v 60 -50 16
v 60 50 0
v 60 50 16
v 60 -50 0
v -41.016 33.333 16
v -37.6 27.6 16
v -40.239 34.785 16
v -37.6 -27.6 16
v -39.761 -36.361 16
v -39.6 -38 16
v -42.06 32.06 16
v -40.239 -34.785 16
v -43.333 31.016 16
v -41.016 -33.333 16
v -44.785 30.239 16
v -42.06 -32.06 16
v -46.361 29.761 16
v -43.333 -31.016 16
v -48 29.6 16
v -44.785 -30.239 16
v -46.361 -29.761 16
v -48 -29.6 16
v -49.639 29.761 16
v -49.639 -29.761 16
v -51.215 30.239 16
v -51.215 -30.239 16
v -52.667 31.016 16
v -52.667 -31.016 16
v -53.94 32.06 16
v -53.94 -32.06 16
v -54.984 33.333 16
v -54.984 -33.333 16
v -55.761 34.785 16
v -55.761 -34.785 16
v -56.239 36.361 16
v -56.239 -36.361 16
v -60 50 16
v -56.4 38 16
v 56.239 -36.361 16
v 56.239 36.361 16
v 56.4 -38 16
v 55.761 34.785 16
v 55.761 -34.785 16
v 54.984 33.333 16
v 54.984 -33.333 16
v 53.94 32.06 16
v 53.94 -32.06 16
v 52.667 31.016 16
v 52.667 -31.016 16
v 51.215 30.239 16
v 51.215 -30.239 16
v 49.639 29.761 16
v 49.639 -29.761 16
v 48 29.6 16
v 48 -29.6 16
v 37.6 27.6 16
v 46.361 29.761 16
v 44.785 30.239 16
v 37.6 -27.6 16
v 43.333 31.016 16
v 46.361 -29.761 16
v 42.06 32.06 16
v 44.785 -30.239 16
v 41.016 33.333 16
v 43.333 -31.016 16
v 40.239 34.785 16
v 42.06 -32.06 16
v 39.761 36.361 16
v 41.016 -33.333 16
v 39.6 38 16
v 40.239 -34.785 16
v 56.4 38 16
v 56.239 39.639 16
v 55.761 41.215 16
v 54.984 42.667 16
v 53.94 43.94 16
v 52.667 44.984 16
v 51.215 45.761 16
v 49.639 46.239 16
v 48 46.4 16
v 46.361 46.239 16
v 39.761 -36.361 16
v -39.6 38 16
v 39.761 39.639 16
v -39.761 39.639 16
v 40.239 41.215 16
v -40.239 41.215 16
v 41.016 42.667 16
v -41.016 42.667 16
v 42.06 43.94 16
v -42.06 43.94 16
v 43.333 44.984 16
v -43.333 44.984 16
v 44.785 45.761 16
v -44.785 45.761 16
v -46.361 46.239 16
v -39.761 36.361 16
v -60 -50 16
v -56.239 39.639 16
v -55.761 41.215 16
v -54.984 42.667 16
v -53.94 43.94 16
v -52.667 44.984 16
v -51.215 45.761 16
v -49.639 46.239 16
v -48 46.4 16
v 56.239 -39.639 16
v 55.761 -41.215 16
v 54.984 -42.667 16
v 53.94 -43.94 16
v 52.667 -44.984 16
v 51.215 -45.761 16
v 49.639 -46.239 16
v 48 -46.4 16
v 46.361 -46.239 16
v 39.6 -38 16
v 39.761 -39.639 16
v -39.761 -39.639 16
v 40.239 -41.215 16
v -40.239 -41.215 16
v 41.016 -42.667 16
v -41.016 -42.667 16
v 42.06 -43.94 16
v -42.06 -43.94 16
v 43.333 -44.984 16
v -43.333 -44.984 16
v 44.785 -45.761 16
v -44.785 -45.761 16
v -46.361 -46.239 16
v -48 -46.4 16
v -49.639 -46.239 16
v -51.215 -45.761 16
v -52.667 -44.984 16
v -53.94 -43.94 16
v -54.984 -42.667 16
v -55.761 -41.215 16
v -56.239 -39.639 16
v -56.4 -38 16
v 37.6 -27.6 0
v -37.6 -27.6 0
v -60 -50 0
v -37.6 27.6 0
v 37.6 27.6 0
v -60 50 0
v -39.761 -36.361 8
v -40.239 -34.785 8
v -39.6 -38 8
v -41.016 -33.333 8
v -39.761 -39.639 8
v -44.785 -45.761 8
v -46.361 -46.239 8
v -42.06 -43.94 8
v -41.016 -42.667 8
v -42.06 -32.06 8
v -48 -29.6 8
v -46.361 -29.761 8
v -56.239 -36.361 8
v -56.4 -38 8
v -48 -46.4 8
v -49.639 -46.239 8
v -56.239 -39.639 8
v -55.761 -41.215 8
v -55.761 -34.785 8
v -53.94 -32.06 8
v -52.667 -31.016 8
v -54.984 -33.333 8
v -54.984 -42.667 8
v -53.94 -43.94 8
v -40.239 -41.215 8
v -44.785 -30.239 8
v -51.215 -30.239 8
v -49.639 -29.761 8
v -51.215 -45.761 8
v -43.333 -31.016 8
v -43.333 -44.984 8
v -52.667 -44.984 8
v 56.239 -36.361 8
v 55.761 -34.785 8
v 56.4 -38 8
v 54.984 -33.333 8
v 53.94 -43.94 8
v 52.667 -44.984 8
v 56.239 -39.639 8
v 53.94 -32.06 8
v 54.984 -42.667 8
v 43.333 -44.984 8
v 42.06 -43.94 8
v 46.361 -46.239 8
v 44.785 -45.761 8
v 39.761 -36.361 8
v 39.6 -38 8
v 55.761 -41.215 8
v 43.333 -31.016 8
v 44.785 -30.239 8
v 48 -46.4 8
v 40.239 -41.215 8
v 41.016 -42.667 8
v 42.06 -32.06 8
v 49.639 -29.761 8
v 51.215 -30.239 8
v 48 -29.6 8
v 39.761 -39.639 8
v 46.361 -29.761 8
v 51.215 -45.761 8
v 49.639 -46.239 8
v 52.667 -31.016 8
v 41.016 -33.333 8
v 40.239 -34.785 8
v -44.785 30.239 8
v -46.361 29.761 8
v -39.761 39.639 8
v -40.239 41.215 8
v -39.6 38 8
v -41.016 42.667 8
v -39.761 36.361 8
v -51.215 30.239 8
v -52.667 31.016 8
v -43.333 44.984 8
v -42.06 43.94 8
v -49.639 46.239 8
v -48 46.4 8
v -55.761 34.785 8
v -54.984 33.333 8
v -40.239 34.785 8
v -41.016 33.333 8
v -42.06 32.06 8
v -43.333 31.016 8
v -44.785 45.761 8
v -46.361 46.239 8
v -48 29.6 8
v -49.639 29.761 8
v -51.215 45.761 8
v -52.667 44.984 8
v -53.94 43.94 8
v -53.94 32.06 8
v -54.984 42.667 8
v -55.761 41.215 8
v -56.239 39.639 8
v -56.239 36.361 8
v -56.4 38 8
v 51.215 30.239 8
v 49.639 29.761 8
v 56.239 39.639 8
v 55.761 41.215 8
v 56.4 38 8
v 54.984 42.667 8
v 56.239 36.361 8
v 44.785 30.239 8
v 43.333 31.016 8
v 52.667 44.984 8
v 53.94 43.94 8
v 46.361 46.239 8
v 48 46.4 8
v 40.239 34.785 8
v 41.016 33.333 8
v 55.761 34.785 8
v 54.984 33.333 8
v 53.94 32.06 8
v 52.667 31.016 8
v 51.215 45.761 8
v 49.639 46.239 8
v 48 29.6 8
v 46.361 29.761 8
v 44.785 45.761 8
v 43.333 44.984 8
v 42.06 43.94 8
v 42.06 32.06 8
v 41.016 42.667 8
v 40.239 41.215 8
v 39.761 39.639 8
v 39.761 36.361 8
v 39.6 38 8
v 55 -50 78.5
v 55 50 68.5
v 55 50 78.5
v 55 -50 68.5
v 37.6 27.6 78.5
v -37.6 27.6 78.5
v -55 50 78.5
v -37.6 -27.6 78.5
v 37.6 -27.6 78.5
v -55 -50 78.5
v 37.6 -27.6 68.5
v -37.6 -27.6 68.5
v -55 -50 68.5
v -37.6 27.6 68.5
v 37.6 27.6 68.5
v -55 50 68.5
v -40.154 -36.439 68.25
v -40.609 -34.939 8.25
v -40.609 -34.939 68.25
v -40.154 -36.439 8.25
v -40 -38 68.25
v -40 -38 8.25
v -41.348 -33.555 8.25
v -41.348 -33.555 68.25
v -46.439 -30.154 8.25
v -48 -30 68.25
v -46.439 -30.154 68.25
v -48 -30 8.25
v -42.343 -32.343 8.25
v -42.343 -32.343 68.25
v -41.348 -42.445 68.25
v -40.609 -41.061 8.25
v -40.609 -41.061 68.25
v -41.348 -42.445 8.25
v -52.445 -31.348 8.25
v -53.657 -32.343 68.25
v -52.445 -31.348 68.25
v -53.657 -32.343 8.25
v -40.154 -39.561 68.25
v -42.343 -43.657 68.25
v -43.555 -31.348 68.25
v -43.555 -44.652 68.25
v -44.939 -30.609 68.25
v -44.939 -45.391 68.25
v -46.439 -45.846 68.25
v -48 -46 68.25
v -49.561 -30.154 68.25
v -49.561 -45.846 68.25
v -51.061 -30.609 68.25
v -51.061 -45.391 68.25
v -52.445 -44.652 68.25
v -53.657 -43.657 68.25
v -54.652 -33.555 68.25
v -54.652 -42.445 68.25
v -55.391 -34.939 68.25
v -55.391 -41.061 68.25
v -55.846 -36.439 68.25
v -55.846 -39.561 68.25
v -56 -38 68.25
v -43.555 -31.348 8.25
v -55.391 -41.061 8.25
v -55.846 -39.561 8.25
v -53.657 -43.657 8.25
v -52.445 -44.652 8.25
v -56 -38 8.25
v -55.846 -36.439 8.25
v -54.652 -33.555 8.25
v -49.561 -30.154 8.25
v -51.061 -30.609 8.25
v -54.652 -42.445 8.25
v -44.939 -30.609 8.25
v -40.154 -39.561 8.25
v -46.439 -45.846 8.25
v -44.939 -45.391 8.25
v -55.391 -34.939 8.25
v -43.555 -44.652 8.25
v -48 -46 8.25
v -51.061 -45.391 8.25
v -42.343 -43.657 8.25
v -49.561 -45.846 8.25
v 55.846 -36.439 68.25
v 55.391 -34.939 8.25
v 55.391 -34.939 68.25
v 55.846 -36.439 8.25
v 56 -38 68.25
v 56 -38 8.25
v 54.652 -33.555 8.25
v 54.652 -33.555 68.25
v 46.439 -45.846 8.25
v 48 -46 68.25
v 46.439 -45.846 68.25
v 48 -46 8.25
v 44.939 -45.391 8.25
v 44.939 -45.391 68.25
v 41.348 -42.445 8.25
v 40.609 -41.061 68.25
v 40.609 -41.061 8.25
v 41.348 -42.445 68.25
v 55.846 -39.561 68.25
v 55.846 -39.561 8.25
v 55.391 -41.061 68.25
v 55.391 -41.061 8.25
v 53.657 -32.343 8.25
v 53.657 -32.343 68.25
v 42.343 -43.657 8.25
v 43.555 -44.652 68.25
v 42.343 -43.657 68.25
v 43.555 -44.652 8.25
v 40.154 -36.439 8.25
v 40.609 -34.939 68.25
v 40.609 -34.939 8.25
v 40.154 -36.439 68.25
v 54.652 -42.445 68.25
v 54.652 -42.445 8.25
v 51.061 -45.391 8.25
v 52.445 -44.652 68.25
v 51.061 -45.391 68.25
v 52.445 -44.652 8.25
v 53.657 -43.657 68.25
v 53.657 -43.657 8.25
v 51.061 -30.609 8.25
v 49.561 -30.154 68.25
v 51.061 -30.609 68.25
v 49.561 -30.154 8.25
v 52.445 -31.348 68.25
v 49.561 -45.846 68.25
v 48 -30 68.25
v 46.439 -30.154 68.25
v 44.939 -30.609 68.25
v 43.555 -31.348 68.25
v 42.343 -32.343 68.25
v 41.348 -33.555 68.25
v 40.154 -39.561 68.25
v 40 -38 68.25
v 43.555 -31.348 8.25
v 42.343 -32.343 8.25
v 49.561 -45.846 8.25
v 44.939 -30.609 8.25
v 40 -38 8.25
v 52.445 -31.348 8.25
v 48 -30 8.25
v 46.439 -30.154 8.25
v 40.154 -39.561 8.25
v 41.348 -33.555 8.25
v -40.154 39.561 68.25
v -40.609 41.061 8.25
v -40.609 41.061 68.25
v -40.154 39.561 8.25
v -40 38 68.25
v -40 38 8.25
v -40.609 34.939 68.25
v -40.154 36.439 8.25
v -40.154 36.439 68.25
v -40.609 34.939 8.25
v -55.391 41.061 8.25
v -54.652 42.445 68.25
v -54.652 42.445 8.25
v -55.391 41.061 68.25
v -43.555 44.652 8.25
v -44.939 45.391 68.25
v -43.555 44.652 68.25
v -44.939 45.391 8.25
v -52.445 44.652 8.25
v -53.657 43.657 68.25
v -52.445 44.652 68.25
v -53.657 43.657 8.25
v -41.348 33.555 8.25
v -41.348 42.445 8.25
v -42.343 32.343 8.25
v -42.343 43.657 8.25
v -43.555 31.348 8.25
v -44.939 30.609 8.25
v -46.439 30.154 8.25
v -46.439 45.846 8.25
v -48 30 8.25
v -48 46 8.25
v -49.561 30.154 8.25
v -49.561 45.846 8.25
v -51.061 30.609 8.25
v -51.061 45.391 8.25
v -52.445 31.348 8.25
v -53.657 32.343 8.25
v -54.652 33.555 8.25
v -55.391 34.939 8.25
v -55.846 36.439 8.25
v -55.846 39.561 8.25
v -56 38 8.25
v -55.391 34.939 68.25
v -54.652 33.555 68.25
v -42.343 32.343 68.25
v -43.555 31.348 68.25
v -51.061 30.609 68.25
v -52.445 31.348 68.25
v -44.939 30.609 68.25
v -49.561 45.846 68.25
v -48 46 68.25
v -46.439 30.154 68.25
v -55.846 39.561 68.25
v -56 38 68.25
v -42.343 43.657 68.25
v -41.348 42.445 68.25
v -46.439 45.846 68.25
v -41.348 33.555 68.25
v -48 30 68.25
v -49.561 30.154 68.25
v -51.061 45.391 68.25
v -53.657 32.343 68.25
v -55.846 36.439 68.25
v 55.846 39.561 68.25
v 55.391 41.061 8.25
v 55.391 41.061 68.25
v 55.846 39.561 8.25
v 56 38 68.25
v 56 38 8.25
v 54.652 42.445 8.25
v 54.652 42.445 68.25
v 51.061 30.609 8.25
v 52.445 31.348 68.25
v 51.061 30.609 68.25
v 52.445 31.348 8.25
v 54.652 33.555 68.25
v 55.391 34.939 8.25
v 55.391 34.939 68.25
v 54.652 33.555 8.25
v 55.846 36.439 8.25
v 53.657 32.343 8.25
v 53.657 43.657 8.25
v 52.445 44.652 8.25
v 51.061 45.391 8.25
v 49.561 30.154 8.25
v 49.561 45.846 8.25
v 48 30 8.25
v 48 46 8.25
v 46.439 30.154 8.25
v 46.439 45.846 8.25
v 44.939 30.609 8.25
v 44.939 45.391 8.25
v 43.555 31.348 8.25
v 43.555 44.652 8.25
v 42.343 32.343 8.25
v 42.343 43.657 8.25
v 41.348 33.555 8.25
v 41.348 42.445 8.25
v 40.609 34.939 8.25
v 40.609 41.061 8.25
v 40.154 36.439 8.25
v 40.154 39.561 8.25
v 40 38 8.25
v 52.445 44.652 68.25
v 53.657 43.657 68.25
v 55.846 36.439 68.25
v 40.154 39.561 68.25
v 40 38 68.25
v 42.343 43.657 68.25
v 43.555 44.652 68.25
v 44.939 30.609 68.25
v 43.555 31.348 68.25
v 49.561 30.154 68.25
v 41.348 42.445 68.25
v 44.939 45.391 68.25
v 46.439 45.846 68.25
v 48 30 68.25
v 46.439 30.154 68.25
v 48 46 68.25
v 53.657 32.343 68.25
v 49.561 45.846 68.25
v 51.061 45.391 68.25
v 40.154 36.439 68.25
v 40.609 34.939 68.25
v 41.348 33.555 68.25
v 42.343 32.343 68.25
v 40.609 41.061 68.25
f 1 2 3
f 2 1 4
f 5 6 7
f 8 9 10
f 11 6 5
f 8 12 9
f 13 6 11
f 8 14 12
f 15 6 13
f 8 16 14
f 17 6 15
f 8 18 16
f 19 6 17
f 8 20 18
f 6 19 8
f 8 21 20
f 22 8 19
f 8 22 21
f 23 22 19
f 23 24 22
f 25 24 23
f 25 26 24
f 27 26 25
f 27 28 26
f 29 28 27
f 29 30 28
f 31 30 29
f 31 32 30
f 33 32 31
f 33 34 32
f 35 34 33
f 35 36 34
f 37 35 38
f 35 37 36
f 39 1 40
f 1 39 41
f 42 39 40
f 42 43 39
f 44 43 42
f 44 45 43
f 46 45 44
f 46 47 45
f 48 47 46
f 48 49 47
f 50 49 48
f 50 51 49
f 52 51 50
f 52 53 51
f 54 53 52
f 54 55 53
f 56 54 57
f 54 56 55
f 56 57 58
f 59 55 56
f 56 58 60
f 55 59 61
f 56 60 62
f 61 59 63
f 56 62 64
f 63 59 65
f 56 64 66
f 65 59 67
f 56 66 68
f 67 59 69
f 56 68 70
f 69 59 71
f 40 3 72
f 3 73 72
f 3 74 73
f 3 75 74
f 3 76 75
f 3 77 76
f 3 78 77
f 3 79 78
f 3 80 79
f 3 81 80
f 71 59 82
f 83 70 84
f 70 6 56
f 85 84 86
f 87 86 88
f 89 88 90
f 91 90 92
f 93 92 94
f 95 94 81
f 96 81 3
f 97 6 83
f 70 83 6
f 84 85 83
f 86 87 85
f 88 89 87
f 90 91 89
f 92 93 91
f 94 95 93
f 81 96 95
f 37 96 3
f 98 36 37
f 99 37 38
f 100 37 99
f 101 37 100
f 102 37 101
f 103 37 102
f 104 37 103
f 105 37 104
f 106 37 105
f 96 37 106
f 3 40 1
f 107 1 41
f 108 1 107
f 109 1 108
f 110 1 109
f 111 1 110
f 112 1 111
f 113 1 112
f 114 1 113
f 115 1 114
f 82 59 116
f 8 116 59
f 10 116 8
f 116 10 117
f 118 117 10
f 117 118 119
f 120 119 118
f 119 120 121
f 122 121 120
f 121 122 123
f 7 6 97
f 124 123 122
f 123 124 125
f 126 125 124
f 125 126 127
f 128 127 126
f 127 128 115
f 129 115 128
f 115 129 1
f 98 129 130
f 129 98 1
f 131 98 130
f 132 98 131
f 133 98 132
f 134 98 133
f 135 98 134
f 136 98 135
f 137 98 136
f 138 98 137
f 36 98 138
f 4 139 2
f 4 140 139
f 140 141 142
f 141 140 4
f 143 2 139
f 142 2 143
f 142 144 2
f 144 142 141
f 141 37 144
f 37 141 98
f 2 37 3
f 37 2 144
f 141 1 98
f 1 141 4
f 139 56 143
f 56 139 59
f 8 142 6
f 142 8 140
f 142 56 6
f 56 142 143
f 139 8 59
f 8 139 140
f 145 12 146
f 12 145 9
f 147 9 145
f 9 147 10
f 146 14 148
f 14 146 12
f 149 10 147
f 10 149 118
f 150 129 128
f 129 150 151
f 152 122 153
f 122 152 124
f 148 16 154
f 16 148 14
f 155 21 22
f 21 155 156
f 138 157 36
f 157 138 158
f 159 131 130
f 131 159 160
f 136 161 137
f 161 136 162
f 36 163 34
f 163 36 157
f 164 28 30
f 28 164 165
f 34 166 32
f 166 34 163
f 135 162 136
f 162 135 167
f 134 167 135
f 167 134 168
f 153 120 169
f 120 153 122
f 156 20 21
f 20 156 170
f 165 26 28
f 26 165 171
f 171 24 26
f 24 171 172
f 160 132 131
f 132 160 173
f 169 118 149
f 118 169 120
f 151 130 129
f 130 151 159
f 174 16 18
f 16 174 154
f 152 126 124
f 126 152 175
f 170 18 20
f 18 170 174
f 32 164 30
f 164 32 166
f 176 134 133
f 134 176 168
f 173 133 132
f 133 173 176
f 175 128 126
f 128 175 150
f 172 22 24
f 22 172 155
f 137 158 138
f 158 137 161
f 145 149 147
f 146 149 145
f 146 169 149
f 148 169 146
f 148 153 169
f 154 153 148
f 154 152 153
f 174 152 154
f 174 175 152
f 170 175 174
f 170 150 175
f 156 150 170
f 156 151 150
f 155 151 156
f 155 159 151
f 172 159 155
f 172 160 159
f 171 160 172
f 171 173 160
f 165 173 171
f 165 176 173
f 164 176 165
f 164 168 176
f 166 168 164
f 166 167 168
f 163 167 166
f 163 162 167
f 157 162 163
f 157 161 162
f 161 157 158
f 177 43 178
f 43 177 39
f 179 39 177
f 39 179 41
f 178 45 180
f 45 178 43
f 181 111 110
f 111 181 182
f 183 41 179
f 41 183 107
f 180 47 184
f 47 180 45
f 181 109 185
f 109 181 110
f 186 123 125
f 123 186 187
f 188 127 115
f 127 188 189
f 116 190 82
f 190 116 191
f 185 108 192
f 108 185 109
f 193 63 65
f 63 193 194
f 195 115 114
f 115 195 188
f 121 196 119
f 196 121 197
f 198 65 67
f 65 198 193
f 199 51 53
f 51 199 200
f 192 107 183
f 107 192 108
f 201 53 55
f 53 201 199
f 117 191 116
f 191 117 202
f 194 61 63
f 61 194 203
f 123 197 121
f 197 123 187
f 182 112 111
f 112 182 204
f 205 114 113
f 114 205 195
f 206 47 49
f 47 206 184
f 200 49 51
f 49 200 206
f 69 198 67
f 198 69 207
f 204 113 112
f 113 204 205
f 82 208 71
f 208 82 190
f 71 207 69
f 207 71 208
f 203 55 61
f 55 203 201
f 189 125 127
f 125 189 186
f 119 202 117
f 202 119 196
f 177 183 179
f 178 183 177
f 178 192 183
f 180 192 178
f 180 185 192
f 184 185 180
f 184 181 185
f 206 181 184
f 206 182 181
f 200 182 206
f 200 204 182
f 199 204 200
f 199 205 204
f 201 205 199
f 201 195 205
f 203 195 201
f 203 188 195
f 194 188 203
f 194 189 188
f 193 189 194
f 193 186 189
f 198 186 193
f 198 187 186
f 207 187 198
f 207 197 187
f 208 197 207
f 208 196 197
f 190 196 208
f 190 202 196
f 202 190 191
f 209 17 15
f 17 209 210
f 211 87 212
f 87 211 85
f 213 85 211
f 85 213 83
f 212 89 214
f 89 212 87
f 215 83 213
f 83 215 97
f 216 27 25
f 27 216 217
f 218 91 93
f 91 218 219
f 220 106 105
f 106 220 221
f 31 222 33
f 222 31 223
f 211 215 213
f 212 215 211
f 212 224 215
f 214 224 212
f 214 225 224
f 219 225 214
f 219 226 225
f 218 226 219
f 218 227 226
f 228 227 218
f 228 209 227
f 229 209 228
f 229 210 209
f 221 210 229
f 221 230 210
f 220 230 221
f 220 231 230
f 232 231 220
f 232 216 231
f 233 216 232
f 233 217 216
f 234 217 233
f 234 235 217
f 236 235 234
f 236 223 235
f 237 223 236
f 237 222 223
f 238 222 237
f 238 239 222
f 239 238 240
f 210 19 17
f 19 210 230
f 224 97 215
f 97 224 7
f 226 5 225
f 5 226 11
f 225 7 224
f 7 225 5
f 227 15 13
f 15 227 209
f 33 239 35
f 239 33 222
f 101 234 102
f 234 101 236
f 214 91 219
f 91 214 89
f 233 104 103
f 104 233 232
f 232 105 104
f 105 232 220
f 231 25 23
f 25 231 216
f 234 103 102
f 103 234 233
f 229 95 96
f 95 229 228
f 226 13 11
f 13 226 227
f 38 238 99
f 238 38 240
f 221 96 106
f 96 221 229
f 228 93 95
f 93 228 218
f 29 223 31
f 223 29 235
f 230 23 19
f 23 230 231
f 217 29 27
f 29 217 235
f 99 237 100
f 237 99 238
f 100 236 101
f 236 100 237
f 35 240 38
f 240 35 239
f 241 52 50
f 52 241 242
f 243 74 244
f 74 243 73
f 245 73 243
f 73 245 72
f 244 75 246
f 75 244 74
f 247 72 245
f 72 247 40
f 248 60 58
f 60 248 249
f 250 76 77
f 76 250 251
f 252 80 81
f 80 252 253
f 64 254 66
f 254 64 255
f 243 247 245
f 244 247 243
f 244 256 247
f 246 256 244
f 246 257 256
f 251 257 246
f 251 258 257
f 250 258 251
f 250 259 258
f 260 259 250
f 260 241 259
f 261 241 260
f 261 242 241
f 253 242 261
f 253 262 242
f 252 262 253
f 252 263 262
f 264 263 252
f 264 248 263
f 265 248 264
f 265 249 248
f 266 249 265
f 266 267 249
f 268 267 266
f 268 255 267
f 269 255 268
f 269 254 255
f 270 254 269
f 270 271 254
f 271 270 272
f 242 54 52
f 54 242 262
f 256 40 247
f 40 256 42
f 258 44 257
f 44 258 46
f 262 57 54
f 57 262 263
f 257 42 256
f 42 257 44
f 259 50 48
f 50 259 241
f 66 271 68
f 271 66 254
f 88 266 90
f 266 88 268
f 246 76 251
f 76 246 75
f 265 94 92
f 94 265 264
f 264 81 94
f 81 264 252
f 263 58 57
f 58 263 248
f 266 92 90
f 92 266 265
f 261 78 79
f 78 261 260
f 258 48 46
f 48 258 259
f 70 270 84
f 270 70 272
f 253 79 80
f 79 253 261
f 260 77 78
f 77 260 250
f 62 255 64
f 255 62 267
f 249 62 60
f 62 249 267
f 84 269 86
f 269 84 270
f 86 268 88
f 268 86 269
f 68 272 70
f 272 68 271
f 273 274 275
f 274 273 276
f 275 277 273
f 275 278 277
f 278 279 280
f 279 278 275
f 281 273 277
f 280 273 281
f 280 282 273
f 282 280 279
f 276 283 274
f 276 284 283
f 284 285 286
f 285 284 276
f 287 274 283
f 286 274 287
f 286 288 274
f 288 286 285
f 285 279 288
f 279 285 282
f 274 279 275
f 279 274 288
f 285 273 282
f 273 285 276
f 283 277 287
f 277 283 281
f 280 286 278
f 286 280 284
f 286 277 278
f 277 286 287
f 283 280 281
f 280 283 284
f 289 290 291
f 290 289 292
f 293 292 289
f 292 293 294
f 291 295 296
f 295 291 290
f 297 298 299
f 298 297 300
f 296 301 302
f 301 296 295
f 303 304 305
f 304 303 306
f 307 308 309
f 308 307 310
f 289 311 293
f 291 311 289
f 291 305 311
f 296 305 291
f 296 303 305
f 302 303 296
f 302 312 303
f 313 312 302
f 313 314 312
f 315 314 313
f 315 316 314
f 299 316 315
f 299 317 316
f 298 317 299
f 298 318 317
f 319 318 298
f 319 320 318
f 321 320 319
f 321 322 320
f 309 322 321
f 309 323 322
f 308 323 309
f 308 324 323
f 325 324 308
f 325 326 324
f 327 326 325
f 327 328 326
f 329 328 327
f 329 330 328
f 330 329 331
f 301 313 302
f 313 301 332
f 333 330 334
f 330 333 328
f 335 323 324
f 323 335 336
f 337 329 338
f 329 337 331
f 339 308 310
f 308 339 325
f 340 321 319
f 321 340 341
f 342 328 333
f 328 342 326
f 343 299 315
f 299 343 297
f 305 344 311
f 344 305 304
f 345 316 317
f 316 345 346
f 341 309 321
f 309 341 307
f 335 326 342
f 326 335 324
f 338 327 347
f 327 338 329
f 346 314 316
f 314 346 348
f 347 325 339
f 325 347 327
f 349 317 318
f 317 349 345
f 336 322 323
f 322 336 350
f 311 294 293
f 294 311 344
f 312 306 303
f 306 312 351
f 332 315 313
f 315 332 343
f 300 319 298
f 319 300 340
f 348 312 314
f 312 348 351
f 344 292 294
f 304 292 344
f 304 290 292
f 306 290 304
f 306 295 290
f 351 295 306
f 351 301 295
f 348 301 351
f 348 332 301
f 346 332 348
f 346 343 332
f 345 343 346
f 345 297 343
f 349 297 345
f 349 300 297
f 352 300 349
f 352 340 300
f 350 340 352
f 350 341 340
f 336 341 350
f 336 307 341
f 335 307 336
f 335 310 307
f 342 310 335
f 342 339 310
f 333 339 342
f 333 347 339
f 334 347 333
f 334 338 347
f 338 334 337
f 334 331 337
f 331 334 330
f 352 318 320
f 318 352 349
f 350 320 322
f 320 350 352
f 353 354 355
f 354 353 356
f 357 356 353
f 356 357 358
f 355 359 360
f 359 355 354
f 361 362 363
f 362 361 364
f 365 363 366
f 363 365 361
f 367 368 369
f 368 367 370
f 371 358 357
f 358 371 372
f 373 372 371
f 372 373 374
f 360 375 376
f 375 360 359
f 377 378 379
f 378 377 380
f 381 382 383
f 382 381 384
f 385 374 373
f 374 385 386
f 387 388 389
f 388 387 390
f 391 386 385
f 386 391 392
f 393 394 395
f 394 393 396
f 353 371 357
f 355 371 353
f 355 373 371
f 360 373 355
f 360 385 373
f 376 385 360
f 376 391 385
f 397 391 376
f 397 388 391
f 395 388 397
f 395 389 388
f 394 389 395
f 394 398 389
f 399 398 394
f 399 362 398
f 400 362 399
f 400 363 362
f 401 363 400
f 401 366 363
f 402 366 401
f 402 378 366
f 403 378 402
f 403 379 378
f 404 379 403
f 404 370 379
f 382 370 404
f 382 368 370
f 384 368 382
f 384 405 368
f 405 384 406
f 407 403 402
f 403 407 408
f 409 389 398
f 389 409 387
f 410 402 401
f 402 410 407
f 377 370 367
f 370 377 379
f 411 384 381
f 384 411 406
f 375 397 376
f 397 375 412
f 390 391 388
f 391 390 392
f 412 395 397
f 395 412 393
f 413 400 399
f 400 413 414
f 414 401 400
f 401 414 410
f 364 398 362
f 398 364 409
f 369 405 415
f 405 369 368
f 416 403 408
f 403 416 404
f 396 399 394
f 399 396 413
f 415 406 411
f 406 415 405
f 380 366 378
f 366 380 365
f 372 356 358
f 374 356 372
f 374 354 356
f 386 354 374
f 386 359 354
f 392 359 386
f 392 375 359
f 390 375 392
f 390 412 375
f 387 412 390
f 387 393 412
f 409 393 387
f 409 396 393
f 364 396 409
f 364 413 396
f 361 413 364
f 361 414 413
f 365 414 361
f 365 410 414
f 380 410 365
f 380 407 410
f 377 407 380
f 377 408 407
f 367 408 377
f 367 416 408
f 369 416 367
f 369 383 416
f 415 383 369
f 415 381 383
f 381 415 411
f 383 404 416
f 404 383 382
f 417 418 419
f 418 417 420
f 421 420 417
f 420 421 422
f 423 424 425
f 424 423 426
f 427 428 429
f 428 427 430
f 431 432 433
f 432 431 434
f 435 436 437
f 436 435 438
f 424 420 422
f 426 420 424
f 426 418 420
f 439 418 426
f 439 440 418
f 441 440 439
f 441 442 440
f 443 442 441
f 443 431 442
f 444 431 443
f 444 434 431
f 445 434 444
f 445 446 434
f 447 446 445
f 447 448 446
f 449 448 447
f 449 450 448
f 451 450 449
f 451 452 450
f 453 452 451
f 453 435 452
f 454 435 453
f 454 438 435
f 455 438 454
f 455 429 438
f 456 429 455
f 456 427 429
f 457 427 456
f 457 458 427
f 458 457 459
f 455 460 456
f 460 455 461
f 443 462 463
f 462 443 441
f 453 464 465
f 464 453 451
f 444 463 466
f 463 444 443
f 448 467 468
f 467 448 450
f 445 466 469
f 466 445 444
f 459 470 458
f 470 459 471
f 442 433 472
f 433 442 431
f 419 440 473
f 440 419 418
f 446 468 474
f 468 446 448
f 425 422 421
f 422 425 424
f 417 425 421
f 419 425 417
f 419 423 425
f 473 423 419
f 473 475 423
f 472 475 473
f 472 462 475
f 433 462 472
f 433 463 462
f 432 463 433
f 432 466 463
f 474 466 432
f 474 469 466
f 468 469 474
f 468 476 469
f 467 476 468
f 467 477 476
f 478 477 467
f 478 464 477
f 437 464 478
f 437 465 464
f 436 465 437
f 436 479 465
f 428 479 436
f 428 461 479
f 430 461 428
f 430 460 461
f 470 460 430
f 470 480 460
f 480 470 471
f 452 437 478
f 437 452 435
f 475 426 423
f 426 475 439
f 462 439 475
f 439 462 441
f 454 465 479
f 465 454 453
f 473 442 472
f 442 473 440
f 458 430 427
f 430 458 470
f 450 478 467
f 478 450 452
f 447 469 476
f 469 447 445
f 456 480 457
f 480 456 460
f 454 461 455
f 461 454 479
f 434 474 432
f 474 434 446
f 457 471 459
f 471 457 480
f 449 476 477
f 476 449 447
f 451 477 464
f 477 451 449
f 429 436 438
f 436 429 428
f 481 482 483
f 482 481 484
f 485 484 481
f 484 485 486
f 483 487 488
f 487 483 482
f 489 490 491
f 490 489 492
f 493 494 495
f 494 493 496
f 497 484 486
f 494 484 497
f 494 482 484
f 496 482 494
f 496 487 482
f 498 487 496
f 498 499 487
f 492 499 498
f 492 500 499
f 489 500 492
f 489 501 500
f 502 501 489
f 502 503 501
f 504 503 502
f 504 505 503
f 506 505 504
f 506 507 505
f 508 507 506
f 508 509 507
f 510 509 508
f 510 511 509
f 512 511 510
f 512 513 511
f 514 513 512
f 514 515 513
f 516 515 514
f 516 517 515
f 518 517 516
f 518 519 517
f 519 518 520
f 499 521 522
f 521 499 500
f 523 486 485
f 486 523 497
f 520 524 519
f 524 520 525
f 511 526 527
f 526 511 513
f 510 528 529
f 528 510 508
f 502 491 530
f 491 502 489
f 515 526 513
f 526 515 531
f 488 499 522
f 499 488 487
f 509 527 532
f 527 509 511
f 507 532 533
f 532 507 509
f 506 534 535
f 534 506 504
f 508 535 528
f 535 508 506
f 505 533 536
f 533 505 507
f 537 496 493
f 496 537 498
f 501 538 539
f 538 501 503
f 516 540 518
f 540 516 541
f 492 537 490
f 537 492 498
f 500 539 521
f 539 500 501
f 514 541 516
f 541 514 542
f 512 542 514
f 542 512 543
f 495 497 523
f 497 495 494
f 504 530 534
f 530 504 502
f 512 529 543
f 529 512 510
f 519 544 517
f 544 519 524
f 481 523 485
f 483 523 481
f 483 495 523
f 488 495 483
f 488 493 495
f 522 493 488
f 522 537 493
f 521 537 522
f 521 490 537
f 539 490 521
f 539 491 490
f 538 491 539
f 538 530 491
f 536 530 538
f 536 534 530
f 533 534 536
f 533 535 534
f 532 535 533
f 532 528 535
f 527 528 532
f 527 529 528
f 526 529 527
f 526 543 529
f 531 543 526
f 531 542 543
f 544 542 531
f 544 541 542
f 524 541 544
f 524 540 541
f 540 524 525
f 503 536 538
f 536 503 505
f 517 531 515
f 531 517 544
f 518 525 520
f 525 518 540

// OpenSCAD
$fn = 32;

// ------------------------------------------------------------------------
// Frame cube: base 120 x 100 mm, posts 60 mm tall
// Every part is its own module, assembly() places every instance.
// ------------------------------------------------------------------------

// --- part 1 ---
module base_frame() {
  difference() {
    translate([-60, -50, 0]) cube([120, 100, 16]);
    translate([-37.6, -27.6, -1]) cube([75.2, 55.2, 18]);
    translate([-48, -38, 8]) cylinder(h = 9, d = 16.8);
    translate([48, -38, 8]) cylinder(h = 9, d = 16.8);
    translate([-48, 38, 8]) cylinder(h = 9, d = 16.8);
    translate([48, 38, 8]) cylinder(h = 9, d = 16.8);
  }
}

// --- part 2 ---
module corner_post() {
  cylinder(h = 60, d = 16);
}

// --- part 3 ---
module top_frame() {
  difference() {
    translate([-55, -50, 0]) cube([110, 100, 10]);
    translate([-37.6, -27.6, -1]) cube([75.2, 55.2, 12]);
  }
}

// --- assembly ---
module assembly() {
  color([0.80, 0.24, 0.20]) translate([0, 0, 0]) rotate([0, 0, 0]) base_frame();
  color([0.20, 0.45, 0.75]) translate([-48, -38, 8.25]) rotate([0, 0, 0]) corner_post();
  color([0.25, 0.62, 0.32]) translate([48, -38, 8.25]) rotate([0, 0, 0]) corner_post();
  color([0.92, 0.70, 0.18]) translate([-48, 38, 8.25]) rotate([0, 0, 0]) corner_post();
  color([0.58, 0.35, 0.70]) translate([48, 38, 8.25]) rotate([0, 0, 0]) corner_post();
  color([0.16, 0.66, 0.66]) translate([0, 0, 68.5]) rotate([0, 0, 0]) top_frame();
}

assembly();
